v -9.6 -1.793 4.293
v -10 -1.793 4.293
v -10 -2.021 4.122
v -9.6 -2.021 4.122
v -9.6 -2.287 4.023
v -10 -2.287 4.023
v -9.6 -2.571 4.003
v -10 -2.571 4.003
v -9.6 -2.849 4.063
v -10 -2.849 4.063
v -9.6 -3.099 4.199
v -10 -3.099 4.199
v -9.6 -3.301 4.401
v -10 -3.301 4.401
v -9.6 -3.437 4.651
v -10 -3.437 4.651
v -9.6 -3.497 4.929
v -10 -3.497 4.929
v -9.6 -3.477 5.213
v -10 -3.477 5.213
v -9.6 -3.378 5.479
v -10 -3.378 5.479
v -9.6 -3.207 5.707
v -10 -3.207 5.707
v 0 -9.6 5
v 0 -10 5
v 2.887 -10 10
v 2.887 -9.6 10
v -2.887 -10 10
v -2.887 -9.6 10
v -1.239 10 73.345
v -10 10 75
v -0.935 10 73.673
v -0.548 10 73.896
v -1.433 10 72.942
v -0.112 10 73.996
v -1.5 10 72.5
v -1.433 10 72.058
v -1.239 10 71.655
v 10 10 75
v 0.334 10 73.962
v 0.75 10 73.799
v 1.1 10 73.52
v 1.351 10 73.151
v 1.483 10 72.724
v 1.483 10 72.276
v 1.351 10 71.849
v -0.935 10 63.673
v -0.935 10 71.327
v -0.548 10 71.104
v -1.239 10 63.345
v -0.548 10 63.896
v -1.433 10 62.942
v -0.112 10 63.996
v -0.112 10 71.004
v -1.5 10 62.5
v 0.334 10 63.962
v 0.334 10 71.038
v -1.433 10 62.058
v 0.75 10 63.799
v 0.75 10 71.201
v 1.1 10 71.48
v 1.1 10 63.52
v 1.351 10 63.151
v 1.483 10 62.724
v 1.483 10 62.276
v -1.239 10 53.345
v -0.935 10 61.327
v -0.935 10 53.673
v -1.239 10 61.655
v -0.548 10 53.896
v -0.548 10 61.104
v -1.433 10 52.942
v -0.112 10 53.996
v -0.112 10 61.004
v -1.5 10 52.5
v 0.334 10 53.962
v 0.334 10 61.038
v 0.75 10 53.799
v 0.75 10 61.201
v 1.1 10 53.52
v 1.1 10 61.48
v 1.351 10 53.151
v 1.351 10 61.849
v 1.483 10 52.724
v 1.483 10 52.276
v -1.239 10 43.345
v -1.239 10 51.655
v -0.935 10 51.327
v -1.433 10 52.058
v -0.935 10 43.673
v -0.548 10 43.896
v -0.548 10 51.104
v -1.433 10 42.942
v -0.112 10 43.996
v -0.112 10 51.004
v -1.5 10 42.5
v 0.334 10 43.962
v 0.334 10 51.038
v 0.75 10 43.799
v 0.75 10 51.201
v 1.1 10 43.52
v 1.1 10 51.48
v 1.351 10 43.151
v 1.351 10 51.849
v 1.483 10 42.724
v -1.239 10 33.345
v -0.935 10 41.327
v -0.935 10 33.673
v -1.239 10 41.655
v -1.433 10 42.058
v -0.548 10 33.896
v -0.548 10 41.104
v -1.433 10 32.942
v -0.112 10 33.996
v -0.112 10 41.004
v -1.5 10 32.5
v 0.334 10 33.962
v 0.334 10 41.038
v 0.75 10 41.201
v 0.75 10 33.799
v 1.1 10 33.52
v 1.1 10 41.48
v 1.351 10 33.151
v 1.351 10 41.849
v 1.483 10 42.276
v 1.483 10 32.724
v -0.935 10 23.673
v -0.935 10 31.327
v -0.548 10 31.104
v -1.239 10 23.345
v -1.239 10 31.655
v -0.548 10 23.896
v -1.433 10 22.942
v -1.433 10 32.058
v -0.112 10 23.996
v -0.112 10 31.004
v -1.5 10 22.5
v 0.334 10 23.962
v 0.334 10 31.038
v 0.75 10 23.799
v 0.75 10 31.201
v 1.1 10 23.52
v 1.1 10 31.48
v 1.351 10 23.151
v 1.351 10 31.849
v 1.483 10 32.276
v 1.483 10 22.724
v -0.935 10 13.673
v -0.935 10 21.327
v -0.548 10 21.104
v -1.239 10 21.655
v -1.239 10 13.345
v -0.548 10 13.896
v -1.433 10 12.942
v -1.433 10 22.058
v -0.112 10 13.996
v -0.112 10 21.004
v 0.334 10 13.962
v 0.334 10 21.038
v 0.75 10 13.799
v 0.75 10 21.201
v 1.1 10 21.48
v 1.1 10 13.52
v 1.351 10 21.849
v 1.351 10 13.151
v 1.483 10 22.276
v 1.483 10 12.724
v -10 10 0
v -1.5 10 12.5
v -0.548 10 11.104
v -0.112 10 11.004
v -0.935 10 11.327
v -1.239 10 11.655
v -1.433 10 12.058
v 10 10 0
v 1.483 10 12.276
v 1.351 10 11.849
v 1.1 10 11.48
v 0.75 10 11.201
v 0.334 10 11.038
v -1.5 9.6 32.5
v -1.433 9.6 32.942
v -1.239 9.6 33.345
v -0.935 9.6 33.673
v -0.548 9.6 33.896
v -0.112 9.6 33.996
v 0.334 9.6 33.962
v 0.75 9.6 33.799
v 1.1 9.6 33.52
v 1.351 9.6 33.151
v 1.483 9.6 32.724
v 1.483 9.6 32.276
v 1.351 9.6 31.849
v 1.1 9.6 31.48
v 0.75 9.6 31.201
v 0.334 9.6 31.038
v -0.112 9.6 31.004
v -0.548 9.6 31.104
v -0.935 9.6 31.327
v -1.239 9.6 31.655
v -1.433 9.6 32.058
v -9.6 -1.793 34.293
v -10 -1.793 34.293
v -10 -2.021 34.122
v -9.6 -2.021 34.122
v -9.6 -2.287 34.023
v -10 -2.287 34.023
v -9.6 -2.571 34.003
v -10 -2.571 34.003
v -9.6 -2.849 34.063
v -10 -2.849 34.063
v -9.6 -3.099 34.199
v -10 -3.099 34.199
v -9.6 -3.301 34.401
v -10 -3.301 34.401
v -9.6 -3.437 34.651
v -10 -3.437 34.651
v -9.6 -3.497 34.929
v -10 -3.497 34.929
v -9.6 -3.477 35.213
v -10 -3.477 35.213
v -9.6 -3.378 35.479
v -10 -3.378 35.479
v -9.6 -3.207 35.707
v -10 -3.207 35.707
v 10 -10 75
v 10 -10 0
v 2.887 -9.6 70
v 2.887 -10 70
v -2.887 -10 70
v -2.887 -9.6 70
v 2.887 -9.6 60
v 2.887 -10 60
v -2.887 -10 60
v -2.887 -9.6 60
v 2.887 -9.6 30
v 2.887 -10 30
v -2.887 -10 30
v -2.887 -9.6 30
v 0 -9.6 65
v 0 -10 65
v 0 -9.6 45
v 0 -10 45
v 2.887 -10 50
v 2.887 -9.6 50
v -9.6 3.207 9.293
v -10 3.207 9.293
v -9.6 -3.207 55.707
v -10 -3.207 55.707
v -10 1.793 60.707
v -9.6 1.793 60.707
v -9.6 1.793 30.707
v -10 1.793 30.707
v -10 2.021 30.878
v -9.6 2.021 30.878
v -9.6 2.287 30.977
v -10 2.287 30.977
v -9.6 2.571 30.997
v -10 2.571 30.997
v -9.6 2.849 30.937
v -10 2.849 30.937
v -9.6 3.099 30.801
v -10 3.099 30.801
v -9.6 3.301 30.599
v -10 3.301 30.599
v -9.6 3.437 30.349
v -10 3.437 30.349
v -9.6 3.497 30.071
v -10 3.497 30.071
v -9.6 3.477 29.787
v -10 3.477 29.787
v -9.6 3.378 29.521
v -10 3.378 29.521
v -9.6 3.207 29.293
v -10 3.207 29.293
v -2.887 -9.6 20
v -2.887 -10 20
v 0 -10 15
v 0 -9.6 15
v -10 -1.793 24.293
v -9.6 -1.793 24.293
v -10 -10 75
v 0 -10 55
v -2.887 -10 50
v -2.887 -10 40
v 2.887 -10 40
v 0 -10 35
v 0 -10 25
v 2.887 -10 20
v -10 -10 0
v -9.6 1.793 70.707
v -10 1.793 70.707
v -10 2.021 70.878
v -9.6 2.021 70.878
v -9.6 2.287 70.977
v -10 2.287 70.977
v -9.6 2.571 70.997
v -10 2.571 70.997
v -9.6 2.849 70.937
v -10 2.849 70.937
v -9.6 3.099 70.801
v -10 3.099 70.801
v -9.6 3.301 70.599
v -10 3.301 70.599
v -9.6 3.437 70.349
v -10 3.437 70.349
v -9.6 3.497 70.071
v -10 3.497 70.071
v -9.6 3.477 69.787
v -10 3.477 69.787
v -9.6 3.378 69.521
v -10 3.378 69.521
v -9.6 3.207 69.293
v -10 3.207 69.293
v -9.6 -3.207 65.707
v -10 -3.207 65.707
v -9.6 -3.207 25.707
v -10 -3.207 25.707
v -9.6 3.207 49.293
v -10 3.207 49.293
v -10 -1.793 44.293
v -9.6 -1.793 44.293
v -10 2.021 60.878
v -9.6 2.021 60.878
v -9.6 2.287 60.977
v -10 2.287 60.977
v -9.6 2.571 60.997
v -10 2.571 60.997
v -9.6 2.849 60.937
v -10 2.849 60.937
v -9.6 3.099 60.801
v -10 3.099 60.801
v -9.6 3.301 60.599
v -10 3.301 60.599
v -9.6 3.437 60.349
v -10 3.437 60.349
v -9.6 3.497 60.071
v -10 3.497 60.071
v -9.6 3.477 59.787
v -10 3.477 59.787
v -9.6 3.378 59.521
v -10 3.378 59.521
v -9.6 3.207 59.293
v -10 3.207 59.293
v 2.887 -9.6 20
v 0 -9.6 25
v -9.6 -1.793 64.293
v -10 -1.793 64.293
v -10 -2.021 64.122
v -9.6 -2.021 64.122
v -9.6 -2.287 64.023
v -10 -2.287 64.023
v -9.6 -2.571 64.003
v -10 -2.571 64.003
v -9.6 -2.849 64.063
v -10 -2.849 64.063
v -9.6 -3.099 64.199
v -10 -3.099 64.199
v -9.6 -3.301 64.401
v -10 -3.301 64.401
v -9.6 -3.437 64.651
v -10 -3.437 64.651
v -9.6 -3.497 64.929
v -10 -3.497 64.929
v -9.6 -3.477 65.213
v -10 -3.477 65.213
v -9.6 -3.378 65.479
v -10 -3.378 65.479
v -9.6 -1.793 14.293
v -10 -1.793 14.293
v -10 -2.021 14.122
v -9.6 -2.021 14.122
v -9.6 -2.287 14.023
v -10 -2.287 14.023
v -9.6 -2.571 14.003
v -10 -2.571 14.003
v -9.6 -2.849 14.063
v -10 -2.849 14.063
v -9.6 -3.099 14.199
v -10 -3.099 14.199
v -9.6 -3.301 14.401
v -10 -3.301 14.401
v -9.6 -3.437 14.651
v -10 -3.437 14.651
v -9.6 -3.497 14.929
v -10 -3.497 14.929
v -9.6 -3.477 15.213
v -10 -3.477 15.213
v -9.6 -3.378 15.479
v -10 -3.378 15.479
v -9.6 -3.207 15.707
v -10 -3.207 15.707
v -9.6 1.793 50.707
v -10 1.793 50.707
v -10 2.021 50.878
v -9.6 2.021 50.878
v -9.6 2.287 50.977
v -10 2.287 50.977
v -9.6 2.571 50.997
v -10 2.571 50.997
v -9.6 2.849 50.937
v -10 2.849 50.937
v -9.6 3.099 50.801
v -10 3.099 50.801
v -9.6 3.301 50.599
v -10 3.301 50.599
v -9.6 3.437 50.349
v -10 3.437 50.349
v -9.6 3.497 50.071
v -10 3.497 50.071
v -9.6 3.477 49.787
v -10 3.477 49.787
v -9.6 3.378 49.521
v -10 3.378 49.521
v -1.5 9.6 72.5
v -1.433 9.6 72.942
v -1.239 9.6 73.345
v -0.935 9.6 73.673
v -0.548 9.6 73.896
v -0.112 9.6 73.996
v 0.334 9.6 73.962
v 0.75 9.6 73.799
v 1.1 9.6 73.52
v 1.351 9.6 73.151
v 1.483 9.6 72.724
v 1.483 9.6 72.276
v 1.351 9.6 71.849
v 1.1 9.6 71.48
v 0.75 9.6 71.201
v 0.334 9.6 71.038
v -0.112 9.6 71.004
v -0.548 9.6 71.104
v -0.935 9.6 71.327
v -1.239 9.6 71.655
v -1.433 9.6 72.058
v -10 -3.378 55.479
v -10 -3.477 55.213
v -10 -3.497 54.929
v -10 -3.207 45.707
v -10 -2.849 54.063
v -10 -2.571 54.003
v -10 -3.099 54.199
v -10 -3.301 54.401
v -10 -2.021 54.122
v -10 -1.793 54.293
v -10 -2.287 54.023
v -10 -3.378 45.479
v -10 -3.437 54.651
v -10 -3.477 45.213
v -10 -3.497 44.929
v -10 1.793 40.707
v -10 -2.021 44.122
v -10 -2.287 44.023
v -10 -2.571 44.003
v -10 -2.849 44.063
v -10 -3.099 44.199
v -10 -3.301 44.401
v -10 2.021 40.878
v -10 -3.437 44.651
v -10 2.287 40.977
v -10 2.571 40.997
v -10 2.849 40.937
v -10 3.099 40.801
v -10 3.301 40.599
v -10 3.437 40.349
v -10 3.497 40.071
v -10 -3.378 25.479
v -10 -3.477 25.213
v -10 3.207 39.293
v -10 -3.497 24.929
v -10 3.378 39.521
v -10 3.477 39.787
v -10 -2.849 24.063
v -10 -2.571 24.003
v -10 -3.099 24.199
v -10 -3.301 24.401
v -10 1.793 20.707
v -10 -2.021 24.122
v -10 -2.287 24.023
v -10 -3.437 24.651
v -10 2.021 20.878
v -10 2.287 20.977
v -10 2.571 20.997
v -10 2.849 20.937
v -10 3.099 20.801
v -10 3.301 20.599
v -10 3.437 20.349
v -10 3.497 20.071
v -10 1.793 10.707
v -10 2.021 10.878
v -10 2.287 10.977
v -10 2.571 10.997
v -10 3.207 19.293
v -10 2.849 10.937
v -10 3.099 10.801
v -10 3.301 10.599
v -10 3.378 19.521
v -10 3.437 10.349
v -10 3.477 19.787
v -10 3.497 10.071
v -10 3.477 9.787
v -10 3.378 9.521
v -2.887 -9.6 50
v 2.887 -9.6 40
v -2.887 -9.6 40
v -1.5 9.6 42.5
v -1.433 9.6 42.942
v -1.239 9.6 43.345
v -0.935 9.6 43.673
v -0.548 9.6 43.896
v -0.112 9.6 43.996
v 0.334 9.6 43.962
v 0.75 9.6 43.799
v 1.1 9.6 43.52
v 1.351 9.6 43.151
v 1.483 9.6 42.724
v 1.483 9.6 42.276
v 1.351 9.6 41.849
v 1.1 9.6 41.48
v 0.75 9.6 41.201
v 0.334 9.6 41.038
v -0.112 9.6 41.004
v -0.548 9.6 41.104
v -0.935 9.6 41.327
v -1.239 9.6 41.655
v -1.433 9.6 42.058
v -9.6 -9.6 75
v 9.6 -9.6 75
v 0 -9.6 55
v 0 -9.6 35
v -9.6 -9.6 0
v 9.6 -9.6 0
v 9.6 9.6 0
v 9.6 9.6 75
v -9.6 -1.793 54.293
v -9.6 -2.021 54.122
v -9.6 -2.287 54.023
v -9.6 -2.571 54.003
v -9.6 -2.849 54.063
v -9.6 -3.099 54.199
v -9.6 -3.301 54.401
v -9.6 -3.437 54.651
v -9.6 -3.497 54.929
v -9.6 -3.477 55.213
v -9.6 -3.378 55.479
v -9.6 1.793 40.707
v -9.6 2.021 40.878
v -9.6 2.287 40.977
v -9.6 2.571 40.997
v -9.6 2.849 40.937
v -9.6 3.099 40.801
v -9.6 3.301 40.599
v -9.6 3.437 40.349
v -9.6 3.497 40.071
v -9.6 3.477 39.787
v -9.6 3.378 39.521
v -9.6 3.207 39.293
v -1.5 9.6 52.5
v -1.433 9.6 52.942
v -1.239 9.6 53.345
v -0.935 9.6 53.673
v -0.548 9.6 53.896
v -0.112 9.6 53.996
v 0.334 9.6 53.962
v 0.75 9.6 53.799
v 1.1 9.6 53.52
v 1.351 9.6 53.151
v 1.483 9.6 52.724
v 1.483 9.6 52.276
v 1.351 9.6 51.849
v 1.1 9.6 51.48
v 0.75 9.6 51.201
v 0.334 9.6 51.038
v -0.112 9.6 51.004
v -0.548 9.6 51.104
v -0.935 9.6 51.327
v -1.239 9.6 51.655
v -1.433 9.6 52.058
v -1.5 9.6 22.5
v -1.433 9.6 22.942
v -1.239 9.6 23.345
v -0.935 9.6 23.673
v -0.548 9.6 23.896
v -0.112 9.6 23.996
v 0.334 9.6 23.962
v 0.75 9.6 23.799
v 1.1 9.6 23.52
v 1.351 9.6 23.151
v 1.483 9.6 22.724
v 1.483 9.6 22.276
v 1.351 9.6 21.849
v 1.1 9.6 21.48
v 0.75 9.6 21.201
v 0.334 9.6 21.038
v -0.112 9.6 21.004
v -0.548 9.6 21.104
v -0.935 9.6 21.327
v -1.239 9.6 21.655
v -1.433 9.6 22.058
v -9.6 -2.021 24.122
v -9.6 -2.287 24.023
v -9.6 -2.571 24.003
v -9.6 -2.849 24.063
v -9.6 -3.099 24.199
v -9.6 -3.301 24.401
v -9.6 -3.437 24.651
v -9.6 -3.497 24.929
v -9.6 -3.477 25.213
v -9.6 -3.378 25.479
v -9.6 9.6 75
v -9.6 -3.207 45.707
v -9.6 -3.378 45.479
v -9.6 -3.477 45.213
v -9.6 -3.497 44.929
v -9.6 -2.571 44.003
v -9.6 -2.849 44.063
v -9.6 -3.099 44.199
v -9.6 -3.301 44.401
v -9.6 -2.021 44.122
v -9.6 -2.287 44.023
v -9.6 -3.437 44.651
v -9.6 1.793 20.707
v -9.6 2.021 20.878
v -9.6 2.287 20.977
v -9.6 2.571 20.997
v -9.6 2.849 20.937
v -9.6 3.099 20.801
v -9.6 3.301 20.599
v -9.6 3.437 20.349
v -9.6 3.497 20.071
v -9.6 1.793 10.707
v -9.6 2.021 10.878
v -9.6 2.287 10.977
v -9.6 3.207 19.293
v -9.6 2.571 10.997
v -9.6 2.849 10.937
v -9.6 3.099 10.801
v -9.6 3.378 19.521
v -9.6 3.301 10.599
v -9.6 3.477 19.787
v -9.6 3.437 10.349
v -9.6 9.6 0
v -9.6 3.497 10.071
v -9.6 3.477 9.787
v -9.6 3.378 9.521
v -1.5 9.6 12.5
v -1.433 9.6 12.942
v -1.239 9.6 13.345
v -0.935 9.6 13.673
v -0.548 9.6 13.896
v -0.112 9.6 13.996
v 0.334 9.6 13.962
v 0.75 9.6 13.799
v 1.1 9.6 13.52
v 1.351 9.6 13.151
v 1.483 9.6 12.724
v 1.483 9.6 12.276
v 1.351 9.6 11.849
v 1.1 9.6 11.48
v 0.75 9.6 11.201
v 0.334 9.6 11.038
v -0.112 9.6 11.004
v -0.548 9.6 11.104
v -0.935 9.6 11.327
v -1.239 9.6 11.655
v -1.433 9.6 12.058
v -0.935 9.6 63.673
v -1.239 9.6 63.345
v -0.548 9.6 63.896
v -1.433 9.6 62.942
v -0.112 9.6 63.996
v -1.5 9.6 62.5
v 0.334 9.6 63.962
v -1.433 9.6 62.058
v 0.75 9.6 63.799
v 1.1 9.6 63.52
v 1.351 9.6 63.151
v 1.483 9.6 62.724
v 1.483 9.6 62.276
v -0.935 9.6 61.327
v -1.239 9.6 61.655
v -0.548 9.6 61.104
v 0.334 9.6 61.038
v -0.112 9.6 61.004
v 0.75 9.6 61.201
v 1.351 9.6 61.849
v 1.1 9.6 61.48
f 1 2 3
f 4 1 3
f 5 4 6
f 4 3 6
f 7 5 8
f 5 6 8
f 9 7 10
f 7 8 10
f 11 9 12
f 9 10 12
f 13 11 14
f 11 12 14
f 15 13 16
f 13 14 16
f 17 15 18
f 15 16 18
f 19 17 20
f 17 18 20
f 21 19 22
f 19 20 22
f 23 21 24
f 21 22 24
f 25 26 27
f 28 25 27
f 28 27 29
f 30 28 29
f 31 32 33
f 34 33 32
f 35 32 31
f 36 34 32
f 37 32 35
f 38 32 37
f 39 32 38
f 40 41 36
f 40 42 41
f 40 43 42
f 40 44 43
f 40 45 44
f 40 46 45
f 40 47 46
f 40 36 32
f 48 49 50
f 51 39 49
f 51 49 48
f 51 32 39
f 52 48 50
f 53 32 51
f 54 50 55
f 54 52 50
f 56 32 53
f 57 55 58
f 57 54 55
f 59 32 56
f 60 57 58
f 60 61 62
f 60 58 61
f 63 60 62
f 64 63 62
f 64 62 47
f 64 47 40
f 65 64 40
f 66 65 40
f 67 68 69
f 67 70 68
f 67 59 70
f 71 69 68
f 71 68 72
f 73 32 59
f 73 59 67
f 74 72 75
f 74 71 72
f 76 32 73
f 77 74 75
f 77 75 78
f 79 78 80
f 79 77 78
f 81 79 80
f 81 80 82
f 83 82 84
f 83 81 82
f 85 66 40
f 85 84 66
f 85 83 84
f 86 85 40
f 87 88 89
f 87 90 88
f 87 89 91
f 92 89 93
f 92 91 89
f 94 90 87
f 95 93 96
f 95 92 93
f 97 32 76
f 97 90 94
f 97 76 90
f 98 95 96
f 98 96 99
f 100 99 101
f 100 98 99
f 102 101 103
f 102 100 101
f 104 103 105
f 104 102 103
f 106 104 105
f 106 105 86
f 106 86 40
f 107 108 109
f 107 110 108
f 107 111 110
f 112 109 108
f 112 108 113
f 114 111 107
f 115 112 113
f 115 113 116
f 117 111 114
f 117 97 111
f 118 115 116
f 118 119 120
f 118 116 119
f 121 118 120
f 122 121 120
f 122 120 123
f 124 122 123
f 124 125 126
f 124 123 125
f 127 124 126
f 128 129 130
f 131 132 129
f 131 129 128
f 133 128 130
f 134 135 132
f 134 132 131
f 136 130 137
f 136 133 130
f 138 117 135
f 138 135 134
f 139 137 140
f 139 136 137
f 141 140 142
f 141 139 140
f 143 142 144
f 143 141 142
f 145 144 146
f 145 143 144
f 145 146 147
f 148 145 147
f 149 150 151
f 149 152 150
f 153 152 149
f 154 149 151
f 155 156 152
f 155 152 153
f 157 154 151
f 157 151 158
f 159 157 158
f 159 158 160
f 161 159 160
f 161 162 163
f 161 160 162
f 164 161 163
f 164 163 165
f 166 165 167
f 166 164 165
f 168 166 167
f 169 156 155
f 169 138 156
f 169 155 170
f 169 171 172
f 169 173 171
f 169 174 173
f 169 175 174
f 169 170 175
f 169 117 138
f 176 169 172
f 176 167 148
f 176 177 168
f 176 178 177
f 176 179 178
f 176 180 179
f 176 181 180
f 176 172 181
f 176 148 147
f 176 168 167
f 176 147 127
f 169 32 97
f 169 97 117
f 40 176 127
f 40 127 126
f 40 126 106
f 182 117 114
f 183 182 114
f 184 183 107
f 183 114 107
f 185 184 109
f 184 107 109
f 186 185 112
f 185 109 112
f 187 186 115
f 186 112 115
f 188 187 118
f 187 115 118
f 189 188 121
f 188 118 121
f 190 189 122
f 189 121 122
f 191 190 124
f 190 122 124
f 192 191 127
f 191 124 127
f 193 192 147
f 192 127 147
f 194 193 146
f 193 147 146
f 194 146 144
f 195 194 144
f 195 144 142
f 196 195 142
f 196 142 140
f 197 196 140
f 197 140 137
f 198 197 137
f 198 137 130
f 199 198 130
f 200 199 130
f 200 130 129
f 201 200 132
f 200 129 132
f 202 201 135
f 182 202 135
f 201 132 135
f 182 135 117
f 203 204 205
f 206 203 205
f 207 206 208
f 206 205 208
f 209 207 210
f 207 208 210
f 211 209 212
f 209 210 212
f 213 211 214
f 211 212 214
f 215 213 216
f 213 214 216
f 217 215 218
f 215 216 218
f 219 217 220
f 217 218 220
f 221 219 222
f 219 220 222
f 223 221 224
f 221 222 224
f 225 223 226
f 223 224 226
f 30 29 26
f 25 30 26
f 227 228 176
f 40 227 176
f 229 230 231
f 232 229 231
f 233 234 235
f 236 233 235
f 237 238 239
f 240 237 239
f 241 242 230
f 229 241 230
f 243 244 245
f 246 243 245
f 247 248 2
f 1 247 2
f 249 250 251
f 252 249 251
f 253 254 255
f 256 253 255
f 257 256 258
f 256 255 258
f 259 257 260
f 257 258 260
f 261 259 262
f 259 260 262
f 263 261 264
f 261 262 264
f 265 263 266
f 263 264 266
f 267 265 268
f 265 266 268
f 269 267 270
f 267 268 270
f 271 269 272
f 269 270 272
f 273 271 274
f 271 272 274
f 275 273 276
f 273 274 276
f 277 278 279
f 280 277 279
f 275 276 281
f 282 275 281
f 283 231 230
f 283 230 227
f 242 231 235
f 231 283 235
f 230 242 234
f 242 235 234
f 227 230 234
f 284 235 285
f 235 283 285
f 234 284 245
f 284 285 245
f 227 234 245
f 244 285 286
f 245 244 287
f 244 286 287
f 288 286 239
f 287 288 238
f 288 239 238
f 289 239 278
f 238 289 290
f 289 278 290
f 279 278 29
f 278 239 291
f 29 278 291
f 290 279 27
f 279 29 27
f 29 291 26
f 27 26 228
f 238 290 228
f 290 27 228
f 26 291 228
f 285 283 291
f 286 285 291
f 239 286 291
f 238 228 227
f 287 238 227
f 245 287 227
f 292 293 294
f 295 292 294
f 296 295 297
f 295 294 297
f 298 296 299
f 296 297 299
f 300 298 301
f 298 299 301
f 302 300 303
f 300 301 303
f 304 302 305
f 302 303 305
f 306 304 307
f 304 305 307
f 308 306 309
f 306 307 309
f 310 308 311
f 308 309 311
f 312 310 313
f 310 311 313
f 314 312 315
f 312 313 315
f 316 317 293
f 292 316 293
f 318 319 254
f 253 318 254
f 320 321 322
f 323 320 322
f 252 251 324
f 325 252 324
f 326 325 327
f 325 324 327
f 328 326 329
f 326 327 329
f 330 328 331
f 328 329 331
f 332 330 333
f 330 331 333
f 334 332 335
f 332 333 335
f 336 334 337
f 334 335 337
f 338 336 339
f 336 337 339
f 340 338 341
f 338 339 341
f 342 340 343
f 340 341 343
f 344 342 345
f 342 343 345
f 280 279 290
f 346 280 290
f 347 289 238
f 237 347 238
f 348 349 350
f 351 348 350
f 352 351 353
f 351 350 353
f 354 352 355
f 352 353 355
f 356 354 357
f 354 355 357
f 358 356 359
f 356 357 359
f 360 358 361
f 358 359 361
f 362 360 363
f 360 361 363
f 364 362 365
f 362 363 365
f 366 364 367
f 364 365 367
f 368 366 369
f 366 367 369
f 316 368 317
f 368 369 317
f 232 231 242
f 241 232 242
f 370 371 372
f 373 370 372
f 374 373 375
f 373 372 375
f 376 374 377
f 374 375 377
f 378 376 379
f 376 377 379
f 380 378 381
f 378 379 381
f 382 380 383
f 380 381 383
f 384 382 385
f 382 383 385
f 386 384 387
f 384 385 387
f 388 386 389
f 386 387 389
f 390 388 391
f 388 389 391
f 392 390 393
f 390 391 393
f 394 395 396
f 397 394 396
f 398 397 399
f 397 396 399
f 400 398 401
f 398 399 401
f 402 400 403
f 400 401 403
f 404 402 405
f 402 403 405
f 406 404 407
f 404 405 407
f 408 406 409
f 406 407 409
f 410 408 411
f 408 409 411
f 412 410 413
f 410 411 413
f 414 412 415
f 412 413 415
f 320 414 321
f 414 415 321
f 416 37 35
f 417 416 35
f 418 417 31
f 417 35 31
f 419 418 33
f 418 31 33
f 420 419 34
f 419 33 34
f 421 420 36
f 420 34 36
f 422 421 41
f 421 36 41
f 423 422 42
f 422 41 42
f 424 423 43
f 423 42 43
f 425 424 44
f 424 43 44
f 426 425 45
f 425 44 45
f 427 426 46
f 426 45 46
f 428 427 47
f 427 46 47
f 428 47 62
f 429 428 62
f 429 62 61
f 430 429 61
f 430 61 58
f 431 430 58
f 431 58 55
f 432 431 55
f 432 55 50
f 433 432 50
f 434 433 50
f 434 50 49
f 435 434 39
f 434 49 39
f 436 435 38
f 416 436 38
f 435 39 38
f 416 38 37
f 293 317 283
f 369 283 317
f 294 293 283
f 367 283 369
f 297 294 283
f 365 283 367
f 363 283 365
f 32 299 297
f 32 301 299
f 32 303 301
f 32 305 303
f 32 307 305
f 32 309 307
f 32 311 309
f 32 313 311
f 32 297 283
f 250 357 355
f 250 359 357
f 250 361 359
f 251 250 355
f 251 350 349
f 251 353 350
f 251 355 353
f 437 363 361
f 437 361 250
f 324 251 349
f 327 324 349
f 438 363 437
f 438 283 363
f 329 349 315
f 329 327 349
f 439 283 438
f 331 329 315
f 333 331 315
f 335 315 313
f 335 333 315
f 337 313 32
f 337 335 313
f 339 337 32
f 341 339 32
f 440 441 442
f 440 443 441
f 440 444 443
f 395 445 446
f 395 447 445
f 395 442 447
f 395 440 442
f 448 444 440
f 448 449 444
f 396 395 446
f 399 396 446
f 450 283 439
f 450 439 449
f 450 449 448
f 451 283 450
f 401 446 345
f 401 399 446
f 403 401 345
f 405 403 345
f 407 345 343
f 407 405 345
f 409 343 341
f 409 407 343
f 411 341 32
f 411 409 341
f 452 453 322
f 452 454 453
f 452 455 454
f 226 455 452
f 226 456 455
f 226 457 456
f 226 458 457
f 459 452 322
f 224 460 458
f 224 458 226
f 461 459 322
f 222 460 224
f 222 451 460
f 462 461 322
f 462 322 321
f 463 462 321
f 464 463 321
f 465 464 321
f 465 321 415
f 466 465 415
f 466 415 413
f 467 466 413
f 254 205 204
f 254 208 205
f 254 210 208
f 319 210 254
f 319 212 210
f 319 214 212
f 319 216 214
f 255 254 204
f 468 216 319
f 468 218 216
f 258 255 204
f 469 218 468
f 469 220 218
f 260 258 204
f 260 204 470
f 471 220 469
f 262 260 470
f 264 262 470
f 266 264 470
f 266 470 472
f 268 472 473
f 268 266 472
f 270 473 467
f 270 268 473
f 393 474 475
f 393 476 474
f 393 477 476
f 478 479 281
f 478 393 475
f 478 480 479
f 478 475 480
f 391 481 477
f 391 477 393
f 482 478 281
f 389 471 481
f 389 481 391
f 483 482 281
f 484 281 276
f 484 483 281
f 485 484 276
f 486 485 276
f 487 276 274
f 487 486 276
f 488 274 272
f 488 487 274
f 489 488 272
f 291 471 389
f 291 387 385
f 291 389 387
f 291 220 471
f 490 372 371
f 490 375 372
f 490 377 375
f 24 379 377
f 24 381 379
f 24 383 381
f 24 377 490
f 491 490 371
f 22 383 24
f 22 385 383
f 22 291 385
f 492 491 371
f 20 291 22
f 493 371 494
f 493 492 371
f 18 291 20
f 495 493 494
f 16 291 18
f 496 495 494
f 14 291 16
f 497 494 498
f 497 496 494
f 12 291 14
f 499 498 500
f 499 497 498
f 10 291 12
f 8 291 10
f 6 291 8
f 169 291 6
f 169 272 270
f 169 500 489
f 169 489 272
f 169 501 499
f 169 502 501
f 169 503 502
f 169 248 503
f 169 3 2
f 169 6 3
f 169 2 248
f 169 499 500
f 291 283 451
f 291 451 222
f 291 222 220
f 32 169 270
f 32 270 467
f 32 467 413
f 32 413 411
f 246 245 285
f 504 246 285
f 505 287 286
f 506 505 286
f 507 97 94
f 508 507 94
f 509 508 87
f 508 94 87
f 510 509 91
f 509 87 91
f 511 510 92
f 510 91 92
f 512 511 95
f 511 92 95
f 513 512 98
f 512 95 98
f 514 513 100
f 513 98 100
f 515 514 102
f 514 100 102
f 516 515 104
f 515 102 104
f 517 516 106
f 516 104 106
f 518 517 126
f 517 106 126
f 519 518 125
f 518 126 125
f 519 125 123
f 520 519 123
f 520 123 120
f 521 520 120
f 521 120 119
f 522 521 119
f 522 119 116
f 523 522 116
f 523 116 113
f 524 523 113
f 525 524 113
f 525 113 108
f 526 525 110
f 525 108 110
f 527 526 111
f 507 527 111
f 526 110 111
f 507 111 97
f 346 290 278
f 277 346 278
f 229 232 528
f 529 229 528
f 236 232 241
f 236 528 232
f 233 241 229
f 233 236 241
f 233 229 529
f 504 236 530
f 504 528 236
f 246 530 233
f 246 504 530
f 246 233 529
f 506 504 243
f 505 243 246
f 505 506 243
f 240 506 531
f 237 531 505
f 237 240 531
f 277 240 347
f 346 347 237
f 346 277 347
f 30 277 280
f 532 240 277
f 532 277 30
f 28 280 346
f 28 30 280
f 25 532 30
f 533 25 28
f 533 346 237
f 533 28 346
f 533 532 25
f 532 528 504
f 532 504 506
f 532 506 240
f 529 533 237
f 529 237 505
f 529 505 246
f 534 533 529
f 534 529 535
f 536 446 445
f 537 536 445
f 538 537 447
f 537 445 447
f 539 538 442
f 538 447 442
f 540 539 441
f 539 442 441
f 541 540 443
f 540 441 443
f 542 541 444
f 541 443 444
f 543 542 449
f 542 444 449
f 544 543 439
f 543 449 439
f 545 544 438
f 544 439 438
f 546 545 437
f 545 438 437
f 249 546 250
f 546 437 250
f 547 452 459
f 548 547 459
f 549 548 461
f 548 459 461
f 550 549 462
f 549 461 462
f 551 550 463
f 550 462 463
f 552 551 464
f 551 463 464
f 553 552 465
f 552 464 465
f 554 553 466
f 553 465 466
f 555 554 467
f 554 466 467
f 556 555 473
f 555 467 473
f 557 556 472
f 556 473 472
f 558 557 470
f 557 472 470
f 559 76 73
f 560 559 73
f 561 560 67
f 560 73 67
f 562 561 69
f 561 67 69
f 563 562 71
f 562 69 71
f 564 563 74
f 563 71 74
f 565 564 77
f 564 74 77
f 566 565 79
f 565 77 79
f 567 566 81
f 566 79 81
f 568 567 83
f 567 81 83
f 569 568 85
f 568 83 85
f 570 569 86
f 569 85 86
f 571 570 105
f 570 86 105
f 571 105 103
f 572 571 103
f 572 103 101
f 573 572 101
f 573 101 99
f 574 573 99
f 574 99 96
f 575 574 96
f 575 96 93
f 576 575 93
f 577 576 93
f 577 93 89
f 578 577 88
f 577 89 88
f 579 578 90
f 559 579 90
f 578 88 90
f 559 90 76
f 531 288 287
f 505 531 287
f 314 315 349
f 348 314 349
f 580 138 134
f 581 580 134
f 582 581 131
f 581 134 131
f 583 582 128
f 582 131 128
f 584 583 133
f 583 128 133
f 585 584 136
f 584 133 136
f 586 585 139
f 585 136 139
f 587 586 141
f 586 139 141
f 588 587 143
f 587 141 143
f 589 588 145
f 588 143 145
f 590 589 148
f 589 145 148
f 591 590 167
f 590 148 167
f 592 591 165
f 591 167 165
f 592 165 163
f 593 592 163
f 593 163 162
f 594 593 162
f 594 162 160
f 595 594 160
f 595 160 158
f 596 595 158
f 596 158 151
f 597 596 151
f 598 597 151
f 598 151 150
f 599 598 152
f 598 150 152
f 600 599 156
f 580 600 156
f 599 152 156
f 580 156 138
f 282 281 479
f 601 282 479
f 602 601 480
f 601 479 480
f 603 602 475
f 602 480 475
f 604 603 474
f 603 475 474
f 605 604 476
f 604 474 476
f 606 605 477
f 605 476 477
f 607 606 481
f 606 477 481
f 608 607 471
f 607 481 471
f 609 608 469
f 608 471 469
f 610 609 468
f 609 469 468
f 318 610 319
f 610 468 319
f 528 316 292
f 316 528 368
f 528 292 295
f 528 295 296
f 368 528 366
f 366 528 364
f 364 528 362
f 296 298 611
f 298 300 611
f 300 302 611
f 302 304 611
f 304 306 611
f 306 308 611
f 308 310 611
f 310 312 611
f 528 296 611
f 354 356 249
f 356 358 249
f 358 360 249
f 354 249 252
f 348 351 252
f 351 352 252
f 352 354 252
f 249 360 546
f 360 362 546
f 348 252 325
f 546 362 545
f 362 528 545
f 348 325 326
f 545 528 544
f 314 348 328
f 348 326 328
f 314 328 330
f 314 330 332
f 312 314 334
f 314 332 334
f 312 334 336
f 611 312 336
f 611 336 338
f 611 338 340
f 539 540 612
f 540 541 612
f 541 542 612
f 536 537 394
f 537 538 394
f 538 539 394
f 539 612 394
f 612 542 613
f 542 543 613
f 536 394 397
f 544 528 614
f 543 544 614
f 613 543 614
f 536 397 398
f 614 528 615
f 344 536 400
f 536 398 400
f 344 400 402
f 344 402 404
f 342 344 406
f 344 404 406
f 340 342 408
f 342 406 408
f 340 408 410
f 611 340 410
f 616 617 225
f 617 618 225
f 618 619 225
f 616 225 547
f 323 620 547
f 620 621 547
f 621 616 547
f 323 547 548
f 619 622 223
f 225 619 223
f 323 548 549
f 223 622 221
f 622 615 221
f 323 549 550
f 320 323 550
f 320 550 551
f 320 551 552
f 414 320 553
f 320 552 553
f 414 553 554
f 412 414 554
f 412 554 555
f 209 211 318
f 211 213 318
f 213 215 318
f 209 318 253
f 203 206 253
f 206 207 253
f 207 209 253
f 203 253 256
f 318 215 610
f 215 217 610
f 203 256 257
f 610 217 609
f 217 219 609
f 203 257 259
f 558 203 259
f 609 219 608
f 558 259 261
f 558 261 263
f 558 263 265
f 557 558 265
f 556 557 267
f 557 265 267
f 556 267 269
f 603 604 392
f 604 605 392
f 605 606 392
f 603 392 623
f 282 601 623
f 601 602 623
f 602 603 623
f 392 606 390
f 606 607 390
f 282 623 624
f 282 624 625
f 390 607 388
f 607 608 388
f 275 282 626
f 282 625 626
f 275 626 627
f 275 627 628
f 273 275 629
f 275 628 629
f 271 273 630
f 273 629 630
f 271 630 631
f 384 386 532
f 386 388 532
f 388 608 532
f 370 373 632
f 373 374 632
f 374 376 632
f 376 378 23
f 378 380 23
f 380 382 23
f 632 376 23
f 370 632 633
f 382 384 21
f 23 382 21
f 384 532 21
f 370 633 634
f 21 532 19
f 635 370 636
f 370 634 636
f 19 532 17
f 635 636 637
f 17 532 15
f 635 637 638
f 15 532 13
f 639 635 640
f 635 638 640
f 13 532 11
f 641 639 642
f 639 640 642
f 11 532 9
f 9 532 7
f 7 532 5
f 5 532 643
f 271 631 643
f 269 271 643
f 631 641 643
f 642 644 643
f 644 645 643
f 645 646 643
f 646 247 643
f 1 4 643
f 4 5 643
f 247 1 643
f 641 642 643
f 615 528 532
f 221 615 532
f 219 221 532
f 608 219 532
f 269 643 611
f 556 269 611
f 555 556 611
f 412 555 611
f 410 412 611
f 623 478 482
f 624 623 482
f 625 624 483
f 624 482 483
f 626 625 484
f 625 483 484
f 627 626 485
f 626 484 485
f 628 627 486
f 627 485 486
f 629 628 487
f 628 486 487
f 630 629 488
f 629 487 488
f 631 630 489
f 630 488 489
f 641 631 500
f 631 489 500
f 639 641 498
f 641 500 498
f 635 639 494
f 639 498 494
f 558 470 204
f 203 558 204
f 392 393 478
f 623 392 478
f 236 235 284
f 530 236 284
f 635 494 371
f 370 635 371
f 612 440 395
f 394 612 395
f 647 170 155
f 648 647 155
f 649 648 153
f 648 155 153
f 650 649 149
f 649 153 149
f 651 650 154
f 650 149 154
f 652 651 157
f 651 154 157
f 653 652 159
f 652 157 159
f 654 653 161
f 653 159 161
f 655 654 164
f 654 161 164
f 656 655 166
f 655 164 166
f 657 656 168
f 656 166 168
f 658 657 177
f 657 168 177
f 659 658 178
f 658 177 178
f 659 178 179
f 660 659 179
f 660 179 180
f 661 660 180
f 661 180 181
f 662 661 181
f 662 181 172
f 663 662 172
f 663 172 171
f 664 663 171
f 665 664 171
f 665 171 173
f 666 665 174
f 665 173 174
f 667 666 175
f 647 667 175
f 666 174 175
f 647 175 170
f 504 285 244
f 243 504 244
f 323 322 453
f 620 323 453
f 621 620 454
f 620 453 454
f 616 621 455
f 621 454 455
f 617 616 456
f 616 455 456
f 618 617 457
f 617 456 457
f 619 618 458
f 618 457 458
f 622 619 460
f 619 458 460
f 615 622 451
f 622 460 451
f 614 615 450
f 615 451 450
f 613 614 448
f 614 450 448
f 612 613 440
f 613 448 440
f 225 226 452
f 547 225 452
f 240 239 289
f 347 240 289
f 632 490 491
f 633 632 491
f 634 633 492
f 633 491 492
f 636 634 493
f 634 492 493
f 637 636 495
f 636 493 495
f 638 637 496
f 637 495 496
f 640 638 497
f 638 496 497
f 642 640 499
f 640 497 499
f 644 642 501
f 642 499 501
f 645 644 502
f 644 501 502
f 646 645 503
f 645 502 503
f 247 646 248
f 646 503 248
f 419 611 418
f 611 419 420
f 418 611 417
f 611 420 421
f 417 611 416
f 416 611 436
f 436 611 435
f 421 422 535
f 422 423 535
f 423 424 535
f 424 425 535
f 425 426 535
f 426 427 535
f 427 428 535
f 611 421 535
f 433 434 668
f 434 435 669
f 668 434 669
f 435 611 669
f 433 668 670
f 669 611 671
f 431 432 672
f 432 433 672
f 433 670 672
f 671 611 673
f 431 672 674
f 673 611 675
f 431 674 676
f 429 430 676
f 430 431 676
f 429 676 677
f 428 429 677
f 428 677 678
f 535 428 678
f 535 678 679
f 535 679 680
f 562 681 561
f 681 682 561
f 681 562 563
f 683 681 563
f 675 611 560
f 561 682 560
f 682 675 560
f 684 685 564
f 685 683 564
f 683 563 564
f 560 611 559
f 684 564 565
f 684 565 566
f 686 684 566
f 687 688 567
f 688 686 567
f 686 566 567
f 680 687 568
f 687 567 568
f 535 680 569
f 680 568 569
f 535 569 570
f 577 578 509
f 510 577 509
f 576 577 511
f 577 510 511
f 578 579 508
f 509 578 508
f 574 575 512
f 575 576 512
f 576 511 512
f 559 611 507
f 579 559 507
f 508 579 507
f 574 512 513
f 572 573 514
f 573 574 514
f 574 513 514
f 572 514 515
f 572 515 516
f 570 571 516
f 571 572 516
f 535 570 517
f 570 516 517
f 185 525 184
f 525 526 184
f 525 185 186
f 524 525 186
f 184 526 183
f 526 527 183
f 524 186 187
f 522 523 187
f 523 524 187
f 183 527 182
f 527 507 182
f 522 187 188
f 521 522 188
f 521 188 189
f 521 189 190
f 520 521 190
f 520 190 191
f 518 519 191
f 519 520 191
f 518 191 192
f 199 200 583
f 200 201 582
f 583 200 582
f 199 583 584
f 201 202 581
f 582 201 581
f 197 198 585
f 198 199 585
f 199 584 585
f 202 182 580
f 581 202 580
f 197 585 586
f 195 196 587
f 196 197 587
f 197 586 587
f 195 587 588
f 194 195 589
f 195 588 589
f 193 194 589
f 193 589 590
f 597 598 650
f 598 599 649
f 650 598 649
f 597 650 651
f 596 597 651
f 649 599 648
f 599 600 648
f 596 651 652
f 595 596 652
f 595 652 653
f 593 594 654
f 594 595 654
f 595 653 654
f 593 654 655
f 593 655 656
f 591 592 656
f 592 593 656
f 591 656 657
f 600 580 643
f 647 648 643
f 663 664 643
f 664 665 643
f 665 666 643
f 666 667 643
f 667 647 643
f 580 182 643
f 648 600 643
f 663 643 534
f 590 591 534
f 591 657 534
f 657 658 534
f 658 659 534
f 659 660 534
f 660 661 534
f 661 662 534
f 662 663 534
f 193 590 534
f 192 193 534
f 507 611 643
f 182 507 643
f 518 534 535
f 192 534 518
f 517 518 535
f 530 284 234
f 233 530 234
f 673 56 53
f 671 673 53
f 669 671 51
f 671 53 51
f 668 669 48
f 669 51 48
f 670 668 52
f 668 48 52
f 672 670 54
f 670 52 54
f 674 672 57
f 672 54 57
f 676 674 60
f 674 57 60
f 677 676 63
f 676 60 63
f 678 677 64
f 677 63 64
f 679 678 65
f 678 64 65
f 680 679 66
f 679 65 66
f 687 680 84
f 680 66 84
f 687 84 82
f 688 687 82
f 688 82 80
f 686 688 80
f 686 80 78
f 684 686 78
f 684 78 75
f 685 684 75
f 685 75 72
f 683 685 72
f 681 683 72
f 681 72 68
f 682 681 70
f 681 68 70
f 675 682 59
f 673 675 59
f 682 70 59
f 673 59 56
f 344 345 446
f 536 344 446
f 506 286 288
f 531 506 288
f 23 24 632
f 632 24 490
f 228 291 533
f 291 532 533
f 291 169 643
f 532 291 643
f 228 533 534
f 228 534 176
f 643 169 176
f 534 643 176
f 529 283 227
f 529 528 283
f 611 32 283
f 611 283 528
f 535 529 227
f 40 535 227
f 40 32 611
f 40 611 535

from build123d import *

# Parameters (mm, degrees)
F0_W     = 20
F0_H     = 20
F0_W_2   = 19.2
F0_H_2   = 19.2
F1_DEPTH = 75
F2_R     = 1.5
F3_DEPTH = 0.4
F5_DEPTH = 0.4
F7_DEPTH = 0.4


with BuildPart() as f1:
    # F0 (on Top) → F1 (new body)
    with BuildSketch(Plane.XY):
        Rectangle(F0_W, F0_H)
        Rectangle(F0_W_2, F0_H_2, mode=Mode.SUBTRACT)
    extrude(amount=F1_DEPTH)

    # F2 (on face) → F3 (cut, through all)
    with BuildSketch(Plane(origin=(0, 10, 0), x_dir=(-1, 0, 0), z_dir=(0, 1, 0))):
        with Locations((0, 62.5)):
            Circle(F2_R)
        with Locations((0, 52.5)):
            Circle(F2_R)
        with Locations((0, 42.5)):
            Circle(F2_R)
        with Locations((0, 32.5)):
            Circle(F2_R)
        with Locations((0, 22.5)):
            Circle(F2_R)
        with Locations((0, 12.5)):
            Circle(F2_R)
        with Locations((0, 72.5)):
            Circle(F2_R)
    extrude(amount=-F3_DEPTH, mode=Mode.SUBTRACT)

    # F4 (on face) → F5 (cut, through all)
    with BuildSketch(Plane.XZ.offset(10)):
        Polygon((2.886751, 10), (-2.886751, 10), (0, 5), align=None)
        Polygon((-2.886751, 20), (0, 15), (2.886751, 20), align=None)
        Polygon((-2.886751, 30), (0, 25), (2.886751, 30), align=None)
        Polygon((-2.886751, 40), (0, 35), (2.886751, 40), align=None)
        Polygon((-2.886751, 50), (0, 45), (2.886751, 50), align=None)
        Polygon((-2.886751, 60), (0, 55), (2.886751, 60), align=None)
        Polygon((-2.886751, 70), (0, 65), (2.886751, 70), align=None)
    extrude(amount=-F5_DEPTH, mode=Mode.SUBTRACT)

    # F6 (on face) → F7 (cut, through all)
    with BuildSketch(Plane(origin=(-10, 0, 0), x_dir=(0, -1, 0), z_dir=(-1, 0, 0))):
        with BuildLine():
            ThreePointArc((-1.792893, 10.707107), (-3.207107, 10.707107), (-3.207107, 9.292893))
            Line((-3.207107, 9.292893), (1.792893, 4.292893))
            ThreePointArc((1.792893, 4.292893), (3.207107, 4.292893), (3.207107, 5.707107))
            Line((3.207107, 5.707107), (-1.792893, 10.707107))
        make_face()
        with BuildLine():
            ThreePointArc((-1.792893, 20.707107), (-3.207107, 20.707107), (-3.207107, 19.292893))
            Line((-3.207107, 19.292893), (1.792893, 14.292893))
            ThreePointArc((1.792893, 14.292893), (3.207107, 14.292893), (3.207107, 15.707107))
            Line((3.207107, 15.707107), (-1.792893, 20.707107))
        make_face()
        with BuildLine():
            ThreePointArc((-1.792893, 30.707107), (-3.207107, 30.707107), (-3.207107, 29.292893))
            Line((-3.207107, 29.292893), (1.792893, 24.292893))
            ThreePointArc((1.792893, 24.292893), (3.207107, 24.292893), (3.207107, 25.707107))
            Line((3.207107, 25.707107), (-1.792893, 30.707107))
        make_face()
        with BuildLine():
            ThreePointArc((-1.792893, 40.707107), (-3.207107, 40.707107), (-3.207107, 39.292893))
            Line((-3.207107, 39.292893), (1.792893, 34.292893))
            ThreePointArc((1.792893, 34.292893), (3.207107, 34.292893), (3.207107, 35.707107))
            Line((3.207107, 35.707107), (-1.792893, 40.707107))
        make_face()
        with BuildLine():
            ThreePointArc((-1.792893, 50.707107), (-3.207107, 50.707107), (-3.207107, 49.292893))
            Line((-3.207107, 49.292893), (1.792893, 44.292893))
            ThreePointArc((1.792893, 44.292893), (3.207107, 44.292893), (3.207107, 45.707107))
            Line((3.207107, 45.707107), (-1.792893, 50.707107))
        make_face()
        with BuildLine():
            ThreePointArc((-1.792893, 60.707107), (-3.207107, 60.707107), (-3.207107, 59.292893))
            Line((-3.207107, 59.292893), (1.792893, 54.292893))
            ThreePointArc((1.792893, 54.292893), (3.207107, 54.292893), (3.207107, 55.707107))
            Line((3.207107, 55.707107), (-1.792893, 60.707107))
        make_face()
        with BuildLine():
            ThreePointArc((-1.792893, 70.707107), (-3.207107, 70.707107), (-3.207107, 69.292893))
            Line((-3.207107, 69.292893), (1.792893, 64.292893))
            ThreePointArc((1.792893, 64.292893), (3.207107, 64.292893), (3.207107, 65.707107))
            Line((3.207107, 65.707107), (-1.792893, 70.707107))
        make_face()
    extrude(amount=-F7_DEPTH, mode=Mode.SUBTRACT)


solid = f1.part
